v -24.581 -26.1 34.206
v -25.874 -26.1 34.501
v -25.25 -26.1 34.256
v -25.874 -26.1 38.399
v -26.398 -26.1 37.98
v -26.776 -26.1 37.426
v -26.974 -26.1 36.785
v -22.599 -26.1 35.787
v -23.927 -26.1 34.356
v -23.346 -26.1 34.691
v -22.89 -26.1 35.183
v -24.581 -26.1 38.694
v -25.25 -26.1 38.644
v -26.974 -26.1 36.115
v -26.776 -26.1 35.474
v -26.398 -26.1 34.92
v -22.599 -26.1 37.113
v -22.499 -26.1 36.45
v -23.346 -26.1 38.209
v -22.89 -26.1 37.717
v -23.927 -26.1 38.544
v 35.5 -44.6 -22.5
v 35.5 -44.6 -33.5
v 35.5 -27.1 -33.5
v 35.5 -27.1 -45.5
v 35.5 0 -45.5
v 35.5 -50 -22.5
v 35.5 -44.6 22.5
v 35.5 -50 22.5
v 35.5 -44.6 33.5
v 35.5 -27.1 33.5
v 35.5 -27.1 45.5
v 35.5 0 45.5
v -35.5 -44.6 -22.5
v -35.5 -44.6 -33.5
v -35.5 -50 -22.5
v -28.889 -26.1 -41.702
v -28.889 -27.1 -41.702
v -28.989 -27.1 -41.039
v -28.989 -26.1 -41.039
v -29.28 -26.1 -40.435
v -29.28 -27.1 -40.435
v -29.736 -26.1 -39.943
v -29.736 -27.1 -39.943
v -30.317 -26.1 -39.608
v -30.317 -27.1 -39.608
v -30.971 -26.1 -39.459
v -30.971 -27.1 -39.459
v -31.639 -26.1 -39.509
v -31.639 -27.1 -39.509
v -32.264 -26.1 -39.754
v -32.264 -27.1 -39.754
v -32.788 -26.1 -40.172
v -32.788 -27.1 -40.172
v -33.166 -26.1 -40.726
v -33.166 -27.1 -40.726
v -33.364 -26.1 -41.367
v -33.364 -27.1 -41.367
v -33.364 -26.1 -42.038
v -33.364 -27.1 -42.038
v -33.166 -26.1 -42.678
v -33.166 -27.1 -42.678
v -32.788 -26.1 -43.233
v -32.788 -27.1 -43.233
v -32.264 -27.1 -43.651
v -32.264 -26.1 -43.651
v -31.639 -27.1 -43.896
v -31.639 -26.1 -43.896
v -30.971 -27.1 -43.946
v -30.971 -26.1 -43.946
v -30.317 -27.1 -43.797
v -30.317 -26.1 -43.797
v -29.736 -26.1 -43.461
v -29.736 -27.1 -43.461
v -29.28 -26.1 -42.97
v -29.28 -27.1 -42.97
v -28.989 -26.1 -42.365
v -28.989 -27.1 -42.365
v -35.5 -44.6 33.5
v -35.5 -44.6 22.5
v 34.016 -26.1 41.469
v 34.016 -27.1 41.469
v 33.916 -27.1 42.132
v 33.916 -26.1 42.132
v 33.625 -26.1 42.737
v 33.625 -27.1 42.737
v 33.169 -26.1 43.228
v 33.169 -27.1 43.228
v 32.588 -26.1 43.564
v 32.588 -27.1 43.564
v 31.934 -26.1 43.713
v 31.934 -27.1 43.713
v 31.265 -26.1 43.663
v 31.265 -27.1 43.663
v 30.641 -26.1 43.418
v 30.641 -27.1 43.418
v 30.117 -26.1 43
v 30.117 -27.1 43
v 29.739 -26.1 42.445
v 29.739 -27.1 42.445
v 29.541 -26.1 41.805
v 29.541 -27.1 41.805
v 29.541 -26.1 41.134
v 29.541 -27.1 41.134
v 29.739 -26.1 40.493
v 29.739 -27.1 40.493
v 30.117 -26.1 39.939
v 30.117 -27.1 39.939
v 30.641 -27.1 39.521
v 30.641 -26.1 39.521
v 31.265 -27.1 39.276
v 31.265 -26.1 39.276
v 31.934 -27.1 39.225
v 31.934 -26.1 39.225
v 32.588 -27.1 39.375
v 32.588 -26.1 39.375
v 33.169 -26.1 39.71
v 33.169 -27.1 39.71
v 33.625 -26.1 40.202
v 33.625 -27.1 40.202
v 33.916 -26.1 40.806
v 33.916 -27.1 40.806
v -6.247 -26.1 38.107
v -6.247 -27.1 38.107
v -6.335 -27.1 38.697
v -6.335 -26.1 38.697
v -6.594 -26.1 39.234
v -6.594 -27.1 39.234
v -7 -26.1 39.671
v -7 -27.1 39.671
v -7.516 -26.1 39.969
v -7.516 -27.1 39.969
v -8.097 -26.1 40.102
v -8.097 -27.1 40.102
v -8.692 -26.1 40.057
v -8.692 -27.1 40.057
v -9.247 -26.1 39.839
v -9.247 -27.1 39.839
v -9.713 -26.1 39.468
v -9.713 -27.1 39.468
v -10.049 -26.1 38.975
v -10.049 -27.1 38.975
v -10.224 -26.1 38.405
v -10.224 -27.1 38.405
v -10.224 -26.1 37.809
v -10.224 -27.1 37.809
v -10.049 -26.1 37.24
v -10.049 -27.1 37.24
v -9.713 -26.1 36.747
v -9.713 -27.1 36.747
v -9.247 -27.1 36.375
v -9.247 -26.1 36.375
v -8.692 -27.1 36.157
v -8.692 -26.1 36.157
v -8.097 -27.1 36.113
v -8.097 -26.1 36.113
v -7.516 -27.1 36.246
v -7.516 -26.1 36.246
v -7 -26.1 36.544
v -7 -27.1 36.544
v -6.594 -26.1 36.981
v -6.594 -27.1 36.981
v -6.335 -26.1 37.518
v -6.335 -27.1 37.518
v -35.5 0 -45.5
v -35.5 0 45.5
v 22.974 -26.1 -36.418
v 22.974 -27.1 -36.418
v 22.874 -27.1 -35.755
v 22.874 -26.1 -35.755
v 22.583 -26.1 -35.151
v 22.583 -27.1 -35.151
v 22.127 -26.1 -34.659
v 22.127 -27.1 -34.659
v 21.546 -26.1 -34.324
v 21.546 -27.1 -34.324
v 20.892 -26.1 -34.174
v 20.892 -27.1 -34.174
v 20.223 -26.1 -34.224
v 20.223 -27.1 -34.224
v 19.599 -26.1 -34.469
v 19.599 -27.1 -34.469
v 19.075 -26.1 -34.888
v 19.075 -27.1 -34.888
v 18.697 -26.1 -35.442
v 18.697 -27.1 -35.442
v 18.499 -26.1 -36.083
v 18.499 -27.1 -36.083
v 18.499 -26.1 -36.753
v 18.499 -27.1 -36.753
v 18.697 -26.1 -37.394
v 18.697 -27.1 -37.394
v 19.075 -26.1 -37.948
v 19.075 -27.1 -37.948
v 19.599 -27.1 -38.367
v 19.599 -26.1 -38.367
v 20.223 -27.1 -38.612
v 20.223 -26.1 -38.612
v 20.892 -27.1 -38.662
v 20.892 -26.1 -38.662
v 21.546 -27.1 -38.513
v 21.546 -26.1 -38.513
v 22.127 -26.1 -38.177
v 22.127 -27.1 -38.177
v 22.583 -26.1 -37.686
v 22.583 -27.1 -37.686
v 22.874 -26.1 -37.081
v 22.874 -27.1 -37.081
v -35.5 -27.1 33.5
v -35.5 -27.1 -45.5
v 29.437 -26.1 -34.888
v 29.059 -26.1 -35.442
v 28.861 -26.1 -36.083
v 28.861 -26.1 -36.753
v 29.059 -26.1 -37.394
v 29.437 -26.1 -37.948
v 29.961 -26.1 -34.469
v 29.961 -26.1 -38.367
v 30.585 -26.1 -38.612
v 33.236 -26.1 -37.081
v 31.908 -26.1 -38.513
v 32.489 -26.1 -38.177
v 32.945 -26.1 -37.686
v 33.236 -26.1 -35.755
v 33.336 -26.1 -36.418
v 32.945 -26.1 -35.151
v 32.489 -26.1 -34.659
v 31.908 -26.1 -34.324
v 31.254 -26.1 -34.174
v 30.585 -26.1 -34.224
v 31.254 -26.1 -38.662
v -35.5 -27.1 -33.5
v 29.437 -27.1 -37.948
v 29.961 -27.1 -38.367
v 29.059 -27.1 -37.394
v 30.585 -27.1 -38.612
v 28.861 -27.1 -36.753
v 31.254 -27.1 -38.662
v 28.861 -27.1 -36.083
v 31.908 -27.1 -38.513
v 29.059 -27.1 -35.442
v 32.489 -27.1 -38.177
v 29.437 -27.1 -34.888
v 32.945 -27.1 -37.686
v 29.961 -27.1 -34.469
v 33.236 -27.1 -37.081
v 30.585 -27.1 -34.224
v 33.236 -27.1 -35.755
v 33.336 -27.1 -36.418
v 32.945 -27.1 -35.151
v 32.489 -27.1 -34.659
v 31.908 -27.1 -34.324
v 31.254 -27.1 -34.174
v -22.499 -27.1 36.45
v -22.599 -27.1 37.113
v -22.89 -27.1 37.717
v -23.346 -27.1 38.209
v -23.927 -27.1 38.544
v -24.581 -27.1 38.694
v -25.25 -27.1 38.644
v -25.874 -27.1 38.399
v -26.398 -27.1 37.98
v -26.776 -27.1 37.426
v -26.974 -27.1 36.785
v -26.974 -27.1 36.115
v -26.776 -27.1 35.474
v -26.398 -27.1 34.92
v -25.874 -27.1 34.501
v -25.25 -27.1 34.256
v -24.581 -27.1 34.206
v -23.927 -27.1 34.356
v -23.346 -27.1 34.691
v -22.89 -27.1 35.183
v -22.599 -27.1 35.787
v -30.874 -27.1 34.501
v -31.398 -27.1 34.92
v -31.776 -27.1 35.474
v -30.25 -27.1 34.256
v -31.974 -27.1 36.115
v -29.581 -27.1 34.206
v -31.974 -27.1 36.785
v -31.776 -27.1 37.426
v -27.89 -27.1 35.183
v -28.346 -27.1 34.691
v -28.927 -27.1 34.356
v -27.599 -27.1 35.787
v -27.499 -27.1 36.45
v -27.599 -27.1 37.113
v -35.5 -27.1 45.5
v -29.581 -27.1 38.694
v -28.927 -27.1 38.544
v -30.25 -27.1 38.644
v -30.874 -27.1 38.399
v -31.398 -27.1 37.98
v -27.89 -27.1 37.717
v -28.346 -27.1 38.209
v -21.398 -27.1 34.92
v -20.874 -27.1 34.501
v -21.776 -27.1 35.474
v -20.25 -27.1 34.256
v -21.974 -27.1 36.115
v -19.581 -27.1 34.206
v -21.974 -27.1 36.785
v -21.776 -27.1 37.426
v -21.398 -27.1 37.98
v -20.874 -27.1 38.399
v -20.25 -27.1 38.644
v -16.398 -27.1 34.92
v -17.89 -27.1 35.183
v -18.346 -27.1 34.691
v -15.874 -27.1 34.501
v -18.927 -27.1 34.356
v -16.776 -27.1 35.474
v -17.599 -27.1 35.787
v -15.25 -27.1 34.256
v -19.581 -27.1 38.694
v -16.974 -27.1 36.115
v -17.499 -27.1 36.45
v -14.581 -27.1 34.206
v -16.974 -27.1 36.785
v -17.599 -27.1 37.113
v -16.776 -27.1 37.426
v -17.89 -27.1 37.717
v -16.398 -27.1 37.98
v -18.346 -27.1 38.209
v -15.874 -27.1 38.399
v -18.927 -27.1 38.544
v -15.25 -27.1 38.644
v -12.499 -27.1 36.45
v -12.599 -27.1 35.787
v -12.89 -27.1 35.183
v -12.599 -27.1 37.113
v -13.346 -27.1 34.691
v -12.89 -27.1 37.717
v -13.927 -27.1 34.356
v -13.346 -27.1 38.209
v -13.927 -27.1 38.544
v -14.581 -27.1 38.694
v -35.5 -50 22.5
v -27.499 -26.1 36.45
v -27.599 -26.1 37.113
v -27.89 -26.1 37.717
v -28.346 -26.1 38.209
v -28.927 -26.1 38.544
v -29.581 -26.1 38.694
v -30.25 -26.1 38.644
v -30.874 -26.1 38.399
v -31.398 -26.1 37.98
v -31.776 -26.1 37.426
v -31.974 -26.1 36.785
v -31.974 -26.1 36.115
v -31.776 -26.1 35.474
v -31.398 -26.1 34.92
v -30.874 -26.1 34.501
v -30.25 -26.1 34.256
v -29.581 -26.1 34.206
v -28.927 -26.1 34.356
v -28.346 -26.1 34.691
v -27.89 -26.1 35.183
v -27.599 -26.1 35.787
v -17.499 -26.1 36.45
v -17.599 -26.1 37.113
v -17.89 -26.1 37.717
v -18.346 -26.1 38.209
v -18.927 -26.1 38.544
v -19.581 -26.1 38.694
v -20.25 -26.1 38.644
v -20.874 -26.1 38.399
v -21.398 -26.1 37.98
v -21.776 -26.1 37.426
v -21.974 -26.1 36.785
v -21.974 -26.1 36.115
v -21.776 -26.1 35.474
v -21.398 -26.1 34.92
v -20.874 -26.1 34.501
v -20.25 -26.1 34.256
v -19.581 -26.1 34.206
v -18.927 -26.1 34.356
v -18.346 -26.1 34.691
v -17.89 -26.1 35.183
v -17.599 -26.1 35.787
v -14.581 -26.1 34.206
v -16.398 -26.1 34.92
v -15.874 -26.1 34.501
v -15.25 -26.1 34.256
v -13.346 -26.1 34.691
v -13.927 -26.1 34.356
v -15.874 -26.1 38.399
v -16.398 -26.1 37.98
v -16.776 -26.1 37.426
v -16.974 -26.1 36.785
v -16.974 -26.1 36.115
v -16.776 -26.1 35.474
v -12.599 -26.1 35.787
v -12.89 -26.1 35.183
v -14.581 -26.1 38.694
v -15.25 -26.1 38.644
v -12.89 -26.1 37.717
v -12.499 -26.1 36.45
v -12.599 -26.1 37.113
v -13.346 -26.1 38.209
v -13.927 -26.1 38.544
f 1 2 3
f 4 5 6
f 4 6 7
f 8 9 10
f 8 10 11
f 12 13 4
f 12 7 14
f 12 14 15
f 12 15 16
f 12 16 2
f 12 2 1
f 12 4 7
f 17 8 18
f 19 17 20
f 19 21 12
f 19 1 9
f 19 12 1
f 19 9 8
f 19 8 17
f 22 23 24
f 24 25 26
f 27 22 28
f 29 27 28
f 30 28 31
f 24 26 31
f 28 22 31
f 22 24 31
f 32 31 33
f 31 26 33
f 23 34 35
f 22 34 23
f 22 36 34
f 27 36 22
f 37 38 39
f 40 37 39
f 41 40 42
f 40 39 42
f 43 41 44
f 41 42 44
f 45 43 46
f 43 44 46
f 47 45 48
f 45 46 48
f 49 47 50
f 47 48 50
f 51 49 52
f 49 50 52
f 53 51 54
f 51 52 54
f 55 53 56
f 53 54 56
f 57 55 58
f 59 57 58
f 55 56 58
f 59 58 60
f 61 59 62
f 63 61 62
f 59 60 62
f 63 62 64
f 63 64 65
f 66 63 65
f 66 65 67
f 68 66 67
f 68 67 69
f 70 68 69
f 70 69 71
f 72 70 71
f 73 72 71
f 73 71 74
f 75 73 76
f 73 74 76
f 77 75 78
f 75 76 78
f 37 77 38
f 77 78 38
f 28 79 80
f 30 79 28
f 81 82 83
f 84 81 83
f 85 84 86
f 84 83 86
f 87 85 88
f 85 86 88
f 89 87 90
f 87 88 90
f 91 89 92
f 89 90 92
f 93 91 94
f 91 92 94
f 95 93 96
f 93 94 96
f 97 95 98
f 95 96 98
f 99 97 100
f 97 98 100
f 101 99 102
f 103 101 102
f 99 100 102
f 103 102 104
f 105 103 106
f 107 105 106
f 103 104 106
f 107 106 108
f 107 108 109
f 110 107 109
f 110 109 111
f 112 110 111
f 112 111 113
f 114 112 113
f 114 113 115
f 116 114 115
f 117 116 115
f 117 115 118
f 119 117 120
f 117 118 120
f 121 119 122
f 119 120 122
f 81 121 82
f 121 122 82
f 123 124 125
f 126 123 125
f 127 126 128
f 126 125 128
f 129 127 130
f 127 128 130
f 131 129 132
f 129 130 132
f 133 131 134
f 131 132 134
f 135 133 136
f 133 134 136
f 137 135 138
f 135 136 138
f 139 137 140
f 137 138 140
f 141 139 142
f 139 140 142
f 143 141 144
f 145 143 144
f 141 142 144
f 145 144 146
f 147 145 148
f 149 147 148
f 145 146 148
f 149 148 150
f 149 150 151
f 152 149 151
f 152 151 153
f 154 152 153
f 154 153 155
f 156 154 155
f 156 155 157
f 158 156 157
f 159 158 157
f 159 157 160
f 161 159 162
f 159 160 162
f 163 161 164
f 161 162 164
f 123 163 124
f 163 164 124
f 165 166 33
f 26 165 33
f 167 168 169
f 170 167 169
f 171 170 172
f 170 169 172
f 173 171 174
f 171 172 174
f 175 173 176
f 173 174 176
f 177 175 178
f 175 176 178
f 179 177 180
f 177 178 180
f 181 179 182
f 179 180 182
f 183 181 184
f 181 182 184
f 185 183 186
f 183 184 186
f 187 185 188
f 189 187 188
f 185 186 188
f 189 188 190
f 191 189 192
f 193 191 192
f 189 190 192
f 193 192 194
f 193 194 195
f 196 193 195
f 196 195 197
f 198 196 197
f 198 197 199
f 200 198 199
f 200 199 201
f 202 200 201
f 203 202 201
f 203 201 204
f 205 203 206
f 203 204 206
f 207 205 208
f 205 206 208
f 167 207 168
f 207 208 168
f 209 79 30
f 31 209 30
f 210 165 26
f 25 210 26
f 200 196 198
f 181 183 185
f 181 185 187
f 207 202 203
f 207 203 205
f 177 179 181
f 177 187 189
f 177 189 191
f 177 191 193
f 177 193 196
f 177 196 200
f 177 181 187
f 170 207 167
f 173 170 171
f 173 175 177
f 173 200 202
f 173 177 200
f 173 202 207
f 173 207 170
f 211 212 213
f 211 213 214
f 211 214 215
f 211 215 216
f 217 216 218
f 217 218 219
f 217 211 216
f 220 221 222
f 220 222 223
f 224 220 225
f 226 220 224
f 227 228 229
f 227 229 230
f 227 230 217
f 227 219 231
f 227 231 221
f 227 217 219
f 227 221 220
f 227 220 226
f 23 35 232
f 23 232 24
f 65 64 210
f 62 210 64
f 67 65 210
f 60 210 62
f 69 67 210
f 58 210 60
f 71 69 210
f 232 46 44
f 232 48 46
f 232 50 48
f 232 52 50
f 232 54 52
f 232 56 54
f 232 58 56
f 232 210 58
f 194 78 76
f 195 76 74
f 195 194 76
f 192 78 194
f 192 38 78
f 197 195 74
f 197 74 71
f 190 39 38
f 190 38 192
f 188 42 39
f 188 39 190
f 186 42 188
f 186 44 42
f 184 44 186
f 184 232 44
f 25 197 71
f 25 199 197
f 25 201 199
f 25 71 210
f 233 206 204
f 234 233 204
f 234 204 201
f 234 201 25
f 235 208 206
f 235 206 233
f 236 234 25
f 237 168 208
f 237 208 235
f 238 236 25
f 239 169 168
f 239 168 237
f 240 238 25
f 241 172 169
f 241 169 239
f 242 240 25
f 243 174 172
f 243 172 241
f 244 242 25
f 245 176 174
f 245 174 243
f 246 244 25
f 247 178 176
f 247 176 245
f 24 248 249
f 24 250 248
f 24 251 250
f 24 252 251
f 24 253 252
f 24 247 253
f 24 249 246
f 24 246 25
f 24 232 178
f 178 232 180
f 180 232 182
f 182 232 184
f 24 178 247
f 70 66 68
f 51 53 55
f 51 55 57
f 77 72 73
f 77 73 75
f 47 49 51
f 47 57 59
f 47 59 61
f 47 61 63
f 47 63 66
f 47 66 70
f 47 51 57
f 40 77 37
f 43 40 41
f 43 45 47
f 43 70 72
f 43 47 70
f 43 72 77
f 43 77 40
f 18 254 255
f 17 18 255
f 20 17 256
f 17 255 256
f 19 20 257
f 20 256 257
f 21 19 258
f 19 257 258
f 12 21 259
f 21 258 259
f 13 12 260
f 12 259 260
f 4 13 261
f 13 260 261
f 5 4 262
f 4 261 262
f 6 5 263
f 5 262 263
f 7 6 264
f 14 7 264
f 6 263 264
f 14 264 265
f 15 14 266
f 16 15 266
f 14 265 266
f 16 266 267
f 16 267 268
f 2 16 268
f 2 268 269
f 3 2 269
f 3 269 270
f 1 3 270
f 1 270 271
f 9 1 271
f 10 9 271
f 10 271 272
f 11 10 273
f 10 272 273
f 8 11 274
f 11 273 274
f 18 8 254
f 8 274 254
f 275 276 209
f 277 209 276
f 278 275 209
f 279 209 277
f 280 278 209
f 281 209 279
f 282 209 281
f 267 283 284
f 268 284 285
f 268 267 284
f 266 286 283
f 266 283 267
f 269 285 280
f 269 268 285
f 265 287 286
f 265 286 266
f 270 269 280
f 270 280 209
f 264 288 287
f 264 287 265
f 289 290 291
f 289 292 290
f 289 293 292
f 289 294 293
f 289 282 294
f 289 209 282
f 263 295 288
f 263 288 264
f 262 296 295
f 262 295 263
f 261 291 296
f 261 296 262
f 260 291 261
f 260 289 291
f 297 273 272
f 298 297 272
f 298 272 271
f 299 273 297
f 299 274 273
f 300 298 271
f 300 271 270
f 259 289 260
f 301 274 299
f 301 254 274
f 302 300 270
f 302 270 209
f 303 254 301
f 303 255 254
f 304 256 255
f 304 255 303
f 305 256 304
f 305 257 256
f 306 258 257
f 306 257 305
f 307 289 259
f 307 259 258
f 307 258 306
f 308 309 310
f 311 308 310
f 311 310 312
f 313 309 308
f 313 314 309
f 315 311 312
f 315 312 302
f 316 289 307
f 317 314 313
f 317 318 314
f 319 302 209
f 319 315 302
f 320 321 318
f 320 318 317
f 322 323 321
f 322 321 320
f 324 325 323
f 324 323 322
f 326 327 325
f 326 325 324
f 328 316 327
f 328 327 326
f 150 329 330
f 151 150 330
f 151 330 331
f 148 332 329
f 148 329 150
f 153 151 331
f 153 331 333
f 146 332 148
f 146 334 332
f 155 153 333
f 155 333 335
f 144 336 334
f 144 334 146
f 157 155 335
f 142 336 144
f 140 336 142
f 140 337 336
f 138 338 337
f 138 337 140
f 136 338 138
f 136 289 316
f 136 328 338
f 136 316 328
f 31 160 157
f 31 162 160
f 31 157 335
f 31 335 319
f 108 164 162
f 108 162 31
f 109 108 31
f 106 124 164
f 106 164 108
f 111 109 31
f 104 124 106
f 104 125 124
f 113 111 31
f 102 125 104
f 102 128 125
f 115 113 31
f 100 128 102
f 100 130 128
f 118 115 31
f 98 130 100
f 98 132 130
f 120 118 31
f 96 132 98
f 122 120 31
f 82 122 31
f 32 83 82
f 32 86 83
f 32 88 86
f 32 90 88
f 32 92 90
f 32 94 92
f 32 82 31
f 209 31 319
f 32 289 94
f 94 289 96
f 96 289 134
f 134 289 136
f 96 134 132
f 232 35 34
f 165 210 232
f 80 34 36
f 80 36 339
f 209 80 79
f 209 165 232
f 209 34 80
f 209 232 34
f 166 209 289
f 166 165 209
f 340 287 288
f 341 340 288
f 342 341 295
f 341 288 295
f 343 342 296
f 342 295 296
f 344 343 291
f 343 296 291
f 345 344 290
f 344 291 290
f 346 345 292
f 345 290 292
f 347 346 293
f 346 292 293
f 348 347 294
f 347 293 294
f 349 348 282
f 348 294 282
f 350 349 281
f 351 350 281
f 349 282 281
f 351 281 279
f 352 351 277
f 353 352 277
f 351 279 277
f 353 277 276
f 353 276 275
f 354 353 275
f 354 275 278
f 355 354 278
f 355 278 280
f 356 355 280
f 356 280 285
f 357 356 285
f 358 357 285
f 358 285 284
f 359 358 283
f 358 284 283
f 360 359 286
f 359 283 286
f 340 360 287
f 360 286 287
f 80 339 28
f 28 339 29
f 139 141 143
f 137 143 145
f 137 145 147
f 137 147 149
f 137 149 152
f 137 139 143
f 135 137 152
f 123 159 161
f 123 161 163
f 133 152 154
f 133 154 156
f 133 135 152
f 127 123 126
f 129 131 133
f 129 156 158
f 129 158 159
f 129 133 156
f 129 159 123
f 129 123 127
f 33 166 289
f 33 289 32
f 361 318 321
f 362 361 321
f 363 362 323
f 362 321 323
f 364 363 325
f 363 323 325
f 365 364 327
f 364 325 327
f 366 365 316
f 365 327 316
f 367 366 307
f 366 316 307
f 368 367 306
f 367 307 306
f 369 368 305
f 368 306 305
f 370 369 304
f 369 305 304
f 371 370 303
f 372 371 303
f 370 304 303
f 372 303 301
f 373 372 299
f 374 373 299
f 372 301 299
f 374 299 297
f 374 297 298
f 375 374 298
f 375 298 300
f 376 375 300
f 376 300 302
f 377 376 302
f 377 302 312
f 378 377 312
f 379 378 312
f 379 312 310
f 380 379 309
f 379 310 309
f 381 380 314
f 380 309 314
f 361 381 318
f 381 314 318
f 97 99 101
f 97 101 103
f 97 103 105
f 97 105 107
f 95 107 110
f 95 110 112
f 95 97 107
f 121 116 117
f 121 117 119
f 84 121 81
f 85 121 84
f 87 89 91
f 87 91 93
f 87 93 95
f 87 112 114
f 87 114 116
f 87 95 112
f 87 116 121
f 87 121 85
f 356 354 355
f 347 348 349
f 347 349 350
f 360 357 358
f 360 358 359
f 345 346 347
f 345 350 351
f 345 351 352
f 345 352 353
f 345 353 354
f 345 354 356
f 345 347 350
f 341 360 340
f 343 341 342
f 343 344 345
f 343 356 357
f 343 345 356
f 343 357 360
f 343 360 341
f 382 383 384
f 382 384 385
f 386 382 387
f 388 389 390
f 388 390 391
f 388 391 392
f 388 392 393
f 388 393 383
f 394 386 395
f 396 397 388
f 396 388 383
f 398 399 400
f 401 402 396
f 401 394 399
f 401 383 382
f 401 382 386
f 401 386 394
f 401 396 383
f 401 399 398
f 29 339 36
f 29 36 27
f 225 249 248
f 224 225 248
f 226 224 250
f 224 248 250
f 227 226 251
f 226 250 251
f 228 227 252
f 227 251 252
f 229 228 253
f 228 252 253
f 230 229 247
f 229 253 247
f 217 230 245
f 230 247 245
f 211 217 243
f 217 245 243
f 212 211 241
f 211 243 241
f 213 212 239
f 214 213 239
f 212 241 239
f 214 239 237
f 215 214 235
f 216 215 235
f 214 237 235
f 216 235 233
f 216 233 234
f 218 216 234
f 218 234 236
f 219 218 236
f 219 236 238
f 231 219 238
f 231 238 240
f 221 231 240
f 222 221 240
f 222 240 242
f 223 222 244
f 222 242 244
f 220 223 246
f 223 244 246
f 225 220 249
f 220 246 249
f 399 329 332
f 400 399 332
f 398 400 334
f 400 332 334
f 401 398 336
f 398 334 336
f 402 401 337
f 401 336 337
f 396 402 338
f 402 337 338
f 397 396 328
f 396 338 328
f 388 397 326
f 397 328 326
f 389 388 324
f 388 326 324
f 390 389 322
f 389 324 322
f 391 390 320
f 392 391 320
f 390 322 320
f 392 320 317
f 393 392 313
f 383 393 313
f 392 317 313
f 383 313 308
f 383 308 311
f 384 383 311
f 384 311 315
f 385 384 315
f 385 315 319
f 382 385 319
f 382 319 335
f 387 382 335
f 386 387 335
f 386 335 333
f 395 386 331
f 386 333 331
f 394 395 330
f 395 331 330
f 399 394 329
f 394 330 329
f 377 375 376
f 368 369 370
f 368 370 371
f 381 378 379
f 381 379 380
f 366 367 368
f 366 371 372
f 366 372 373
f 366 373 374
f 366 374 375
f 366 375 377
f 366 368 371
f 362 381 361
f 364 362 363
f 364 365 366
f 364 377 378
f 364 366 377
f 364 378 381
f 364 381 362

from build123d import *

# Parameters (mm, degrees)
F0_W     = 71
F0_H     = 91
F1_DEPTH = 50
F2_W     = 71
F2_H     = 12
F3_DEPTH = 22.9
F4_W     = 71
F4_H     = 11
F5_DEPTH = 5.4
F6_R     = 2.25
F6_R_2   = 2
F7_DEPTH = 1


with BuildPart() as f1:
    # F0 (on Front) → F1 (new body)
    with BuildSketch(Plane.XZ):
        Rectangle(F0_W, F0_H)
    extrude(amount=F1_DEPTH)

    # F2 (on face) → F3 (cut)
    with BuildSketch(Plane.XZ.offset(50)):
        with Locations((0, 39.5)):
            Rectangle(F2_W, F2_H)
        with Locations((0, -39.5)):
            Rectangle(F2_W, F2_H)
    extrude(amount=-F3_DEPTH, mode=Mode.SUBTRACT)

    # F4 (on face) → F5 (cut)
    with BuildSketch(Plane.XZ.offset(50)):
        with Locations((0, 28)):
            Rectangle(F4_W, F4_H)
        with Locations((0, -28)):
            Rectangle(F4_W, F4_H)
    extrude(amount=-F5_DEPTH, mode=Mode.SUBTRACT)

    # F6 (on face) → F7 (cut)
    with BuildSketch(Plane.XZ.offset(27.1)):
        with Locations((-29.748868, 36.449973)):
            Circle(F6_R)
        with Locations((-24.748868, 36.449973)):
            Circle(F6_R)
        with Locations((-19.748868, 36.449973)):
            Circle(F6_R)
        with Locations((-14.748868, 36.449973)):
            Circle(F6_R)
        with Locations((-8.246585, 38.107269)):
            Circle(F6_R_2)
        with Locations((31.766169, 41.469164)):
            Circle(F6_R)
        with Locations((-31.138731, -41.702226)):
            Circle(F6_R)
        with Locations((20.723933, -36.418043)):
            Circle(F6_R)
        with Locations((31.085899, -36.418043)):
            Circle(F6_R)
    extrude(amount=-F7_DEPTH, mode=Mode.SUBTRACT)


solid = f1.part
